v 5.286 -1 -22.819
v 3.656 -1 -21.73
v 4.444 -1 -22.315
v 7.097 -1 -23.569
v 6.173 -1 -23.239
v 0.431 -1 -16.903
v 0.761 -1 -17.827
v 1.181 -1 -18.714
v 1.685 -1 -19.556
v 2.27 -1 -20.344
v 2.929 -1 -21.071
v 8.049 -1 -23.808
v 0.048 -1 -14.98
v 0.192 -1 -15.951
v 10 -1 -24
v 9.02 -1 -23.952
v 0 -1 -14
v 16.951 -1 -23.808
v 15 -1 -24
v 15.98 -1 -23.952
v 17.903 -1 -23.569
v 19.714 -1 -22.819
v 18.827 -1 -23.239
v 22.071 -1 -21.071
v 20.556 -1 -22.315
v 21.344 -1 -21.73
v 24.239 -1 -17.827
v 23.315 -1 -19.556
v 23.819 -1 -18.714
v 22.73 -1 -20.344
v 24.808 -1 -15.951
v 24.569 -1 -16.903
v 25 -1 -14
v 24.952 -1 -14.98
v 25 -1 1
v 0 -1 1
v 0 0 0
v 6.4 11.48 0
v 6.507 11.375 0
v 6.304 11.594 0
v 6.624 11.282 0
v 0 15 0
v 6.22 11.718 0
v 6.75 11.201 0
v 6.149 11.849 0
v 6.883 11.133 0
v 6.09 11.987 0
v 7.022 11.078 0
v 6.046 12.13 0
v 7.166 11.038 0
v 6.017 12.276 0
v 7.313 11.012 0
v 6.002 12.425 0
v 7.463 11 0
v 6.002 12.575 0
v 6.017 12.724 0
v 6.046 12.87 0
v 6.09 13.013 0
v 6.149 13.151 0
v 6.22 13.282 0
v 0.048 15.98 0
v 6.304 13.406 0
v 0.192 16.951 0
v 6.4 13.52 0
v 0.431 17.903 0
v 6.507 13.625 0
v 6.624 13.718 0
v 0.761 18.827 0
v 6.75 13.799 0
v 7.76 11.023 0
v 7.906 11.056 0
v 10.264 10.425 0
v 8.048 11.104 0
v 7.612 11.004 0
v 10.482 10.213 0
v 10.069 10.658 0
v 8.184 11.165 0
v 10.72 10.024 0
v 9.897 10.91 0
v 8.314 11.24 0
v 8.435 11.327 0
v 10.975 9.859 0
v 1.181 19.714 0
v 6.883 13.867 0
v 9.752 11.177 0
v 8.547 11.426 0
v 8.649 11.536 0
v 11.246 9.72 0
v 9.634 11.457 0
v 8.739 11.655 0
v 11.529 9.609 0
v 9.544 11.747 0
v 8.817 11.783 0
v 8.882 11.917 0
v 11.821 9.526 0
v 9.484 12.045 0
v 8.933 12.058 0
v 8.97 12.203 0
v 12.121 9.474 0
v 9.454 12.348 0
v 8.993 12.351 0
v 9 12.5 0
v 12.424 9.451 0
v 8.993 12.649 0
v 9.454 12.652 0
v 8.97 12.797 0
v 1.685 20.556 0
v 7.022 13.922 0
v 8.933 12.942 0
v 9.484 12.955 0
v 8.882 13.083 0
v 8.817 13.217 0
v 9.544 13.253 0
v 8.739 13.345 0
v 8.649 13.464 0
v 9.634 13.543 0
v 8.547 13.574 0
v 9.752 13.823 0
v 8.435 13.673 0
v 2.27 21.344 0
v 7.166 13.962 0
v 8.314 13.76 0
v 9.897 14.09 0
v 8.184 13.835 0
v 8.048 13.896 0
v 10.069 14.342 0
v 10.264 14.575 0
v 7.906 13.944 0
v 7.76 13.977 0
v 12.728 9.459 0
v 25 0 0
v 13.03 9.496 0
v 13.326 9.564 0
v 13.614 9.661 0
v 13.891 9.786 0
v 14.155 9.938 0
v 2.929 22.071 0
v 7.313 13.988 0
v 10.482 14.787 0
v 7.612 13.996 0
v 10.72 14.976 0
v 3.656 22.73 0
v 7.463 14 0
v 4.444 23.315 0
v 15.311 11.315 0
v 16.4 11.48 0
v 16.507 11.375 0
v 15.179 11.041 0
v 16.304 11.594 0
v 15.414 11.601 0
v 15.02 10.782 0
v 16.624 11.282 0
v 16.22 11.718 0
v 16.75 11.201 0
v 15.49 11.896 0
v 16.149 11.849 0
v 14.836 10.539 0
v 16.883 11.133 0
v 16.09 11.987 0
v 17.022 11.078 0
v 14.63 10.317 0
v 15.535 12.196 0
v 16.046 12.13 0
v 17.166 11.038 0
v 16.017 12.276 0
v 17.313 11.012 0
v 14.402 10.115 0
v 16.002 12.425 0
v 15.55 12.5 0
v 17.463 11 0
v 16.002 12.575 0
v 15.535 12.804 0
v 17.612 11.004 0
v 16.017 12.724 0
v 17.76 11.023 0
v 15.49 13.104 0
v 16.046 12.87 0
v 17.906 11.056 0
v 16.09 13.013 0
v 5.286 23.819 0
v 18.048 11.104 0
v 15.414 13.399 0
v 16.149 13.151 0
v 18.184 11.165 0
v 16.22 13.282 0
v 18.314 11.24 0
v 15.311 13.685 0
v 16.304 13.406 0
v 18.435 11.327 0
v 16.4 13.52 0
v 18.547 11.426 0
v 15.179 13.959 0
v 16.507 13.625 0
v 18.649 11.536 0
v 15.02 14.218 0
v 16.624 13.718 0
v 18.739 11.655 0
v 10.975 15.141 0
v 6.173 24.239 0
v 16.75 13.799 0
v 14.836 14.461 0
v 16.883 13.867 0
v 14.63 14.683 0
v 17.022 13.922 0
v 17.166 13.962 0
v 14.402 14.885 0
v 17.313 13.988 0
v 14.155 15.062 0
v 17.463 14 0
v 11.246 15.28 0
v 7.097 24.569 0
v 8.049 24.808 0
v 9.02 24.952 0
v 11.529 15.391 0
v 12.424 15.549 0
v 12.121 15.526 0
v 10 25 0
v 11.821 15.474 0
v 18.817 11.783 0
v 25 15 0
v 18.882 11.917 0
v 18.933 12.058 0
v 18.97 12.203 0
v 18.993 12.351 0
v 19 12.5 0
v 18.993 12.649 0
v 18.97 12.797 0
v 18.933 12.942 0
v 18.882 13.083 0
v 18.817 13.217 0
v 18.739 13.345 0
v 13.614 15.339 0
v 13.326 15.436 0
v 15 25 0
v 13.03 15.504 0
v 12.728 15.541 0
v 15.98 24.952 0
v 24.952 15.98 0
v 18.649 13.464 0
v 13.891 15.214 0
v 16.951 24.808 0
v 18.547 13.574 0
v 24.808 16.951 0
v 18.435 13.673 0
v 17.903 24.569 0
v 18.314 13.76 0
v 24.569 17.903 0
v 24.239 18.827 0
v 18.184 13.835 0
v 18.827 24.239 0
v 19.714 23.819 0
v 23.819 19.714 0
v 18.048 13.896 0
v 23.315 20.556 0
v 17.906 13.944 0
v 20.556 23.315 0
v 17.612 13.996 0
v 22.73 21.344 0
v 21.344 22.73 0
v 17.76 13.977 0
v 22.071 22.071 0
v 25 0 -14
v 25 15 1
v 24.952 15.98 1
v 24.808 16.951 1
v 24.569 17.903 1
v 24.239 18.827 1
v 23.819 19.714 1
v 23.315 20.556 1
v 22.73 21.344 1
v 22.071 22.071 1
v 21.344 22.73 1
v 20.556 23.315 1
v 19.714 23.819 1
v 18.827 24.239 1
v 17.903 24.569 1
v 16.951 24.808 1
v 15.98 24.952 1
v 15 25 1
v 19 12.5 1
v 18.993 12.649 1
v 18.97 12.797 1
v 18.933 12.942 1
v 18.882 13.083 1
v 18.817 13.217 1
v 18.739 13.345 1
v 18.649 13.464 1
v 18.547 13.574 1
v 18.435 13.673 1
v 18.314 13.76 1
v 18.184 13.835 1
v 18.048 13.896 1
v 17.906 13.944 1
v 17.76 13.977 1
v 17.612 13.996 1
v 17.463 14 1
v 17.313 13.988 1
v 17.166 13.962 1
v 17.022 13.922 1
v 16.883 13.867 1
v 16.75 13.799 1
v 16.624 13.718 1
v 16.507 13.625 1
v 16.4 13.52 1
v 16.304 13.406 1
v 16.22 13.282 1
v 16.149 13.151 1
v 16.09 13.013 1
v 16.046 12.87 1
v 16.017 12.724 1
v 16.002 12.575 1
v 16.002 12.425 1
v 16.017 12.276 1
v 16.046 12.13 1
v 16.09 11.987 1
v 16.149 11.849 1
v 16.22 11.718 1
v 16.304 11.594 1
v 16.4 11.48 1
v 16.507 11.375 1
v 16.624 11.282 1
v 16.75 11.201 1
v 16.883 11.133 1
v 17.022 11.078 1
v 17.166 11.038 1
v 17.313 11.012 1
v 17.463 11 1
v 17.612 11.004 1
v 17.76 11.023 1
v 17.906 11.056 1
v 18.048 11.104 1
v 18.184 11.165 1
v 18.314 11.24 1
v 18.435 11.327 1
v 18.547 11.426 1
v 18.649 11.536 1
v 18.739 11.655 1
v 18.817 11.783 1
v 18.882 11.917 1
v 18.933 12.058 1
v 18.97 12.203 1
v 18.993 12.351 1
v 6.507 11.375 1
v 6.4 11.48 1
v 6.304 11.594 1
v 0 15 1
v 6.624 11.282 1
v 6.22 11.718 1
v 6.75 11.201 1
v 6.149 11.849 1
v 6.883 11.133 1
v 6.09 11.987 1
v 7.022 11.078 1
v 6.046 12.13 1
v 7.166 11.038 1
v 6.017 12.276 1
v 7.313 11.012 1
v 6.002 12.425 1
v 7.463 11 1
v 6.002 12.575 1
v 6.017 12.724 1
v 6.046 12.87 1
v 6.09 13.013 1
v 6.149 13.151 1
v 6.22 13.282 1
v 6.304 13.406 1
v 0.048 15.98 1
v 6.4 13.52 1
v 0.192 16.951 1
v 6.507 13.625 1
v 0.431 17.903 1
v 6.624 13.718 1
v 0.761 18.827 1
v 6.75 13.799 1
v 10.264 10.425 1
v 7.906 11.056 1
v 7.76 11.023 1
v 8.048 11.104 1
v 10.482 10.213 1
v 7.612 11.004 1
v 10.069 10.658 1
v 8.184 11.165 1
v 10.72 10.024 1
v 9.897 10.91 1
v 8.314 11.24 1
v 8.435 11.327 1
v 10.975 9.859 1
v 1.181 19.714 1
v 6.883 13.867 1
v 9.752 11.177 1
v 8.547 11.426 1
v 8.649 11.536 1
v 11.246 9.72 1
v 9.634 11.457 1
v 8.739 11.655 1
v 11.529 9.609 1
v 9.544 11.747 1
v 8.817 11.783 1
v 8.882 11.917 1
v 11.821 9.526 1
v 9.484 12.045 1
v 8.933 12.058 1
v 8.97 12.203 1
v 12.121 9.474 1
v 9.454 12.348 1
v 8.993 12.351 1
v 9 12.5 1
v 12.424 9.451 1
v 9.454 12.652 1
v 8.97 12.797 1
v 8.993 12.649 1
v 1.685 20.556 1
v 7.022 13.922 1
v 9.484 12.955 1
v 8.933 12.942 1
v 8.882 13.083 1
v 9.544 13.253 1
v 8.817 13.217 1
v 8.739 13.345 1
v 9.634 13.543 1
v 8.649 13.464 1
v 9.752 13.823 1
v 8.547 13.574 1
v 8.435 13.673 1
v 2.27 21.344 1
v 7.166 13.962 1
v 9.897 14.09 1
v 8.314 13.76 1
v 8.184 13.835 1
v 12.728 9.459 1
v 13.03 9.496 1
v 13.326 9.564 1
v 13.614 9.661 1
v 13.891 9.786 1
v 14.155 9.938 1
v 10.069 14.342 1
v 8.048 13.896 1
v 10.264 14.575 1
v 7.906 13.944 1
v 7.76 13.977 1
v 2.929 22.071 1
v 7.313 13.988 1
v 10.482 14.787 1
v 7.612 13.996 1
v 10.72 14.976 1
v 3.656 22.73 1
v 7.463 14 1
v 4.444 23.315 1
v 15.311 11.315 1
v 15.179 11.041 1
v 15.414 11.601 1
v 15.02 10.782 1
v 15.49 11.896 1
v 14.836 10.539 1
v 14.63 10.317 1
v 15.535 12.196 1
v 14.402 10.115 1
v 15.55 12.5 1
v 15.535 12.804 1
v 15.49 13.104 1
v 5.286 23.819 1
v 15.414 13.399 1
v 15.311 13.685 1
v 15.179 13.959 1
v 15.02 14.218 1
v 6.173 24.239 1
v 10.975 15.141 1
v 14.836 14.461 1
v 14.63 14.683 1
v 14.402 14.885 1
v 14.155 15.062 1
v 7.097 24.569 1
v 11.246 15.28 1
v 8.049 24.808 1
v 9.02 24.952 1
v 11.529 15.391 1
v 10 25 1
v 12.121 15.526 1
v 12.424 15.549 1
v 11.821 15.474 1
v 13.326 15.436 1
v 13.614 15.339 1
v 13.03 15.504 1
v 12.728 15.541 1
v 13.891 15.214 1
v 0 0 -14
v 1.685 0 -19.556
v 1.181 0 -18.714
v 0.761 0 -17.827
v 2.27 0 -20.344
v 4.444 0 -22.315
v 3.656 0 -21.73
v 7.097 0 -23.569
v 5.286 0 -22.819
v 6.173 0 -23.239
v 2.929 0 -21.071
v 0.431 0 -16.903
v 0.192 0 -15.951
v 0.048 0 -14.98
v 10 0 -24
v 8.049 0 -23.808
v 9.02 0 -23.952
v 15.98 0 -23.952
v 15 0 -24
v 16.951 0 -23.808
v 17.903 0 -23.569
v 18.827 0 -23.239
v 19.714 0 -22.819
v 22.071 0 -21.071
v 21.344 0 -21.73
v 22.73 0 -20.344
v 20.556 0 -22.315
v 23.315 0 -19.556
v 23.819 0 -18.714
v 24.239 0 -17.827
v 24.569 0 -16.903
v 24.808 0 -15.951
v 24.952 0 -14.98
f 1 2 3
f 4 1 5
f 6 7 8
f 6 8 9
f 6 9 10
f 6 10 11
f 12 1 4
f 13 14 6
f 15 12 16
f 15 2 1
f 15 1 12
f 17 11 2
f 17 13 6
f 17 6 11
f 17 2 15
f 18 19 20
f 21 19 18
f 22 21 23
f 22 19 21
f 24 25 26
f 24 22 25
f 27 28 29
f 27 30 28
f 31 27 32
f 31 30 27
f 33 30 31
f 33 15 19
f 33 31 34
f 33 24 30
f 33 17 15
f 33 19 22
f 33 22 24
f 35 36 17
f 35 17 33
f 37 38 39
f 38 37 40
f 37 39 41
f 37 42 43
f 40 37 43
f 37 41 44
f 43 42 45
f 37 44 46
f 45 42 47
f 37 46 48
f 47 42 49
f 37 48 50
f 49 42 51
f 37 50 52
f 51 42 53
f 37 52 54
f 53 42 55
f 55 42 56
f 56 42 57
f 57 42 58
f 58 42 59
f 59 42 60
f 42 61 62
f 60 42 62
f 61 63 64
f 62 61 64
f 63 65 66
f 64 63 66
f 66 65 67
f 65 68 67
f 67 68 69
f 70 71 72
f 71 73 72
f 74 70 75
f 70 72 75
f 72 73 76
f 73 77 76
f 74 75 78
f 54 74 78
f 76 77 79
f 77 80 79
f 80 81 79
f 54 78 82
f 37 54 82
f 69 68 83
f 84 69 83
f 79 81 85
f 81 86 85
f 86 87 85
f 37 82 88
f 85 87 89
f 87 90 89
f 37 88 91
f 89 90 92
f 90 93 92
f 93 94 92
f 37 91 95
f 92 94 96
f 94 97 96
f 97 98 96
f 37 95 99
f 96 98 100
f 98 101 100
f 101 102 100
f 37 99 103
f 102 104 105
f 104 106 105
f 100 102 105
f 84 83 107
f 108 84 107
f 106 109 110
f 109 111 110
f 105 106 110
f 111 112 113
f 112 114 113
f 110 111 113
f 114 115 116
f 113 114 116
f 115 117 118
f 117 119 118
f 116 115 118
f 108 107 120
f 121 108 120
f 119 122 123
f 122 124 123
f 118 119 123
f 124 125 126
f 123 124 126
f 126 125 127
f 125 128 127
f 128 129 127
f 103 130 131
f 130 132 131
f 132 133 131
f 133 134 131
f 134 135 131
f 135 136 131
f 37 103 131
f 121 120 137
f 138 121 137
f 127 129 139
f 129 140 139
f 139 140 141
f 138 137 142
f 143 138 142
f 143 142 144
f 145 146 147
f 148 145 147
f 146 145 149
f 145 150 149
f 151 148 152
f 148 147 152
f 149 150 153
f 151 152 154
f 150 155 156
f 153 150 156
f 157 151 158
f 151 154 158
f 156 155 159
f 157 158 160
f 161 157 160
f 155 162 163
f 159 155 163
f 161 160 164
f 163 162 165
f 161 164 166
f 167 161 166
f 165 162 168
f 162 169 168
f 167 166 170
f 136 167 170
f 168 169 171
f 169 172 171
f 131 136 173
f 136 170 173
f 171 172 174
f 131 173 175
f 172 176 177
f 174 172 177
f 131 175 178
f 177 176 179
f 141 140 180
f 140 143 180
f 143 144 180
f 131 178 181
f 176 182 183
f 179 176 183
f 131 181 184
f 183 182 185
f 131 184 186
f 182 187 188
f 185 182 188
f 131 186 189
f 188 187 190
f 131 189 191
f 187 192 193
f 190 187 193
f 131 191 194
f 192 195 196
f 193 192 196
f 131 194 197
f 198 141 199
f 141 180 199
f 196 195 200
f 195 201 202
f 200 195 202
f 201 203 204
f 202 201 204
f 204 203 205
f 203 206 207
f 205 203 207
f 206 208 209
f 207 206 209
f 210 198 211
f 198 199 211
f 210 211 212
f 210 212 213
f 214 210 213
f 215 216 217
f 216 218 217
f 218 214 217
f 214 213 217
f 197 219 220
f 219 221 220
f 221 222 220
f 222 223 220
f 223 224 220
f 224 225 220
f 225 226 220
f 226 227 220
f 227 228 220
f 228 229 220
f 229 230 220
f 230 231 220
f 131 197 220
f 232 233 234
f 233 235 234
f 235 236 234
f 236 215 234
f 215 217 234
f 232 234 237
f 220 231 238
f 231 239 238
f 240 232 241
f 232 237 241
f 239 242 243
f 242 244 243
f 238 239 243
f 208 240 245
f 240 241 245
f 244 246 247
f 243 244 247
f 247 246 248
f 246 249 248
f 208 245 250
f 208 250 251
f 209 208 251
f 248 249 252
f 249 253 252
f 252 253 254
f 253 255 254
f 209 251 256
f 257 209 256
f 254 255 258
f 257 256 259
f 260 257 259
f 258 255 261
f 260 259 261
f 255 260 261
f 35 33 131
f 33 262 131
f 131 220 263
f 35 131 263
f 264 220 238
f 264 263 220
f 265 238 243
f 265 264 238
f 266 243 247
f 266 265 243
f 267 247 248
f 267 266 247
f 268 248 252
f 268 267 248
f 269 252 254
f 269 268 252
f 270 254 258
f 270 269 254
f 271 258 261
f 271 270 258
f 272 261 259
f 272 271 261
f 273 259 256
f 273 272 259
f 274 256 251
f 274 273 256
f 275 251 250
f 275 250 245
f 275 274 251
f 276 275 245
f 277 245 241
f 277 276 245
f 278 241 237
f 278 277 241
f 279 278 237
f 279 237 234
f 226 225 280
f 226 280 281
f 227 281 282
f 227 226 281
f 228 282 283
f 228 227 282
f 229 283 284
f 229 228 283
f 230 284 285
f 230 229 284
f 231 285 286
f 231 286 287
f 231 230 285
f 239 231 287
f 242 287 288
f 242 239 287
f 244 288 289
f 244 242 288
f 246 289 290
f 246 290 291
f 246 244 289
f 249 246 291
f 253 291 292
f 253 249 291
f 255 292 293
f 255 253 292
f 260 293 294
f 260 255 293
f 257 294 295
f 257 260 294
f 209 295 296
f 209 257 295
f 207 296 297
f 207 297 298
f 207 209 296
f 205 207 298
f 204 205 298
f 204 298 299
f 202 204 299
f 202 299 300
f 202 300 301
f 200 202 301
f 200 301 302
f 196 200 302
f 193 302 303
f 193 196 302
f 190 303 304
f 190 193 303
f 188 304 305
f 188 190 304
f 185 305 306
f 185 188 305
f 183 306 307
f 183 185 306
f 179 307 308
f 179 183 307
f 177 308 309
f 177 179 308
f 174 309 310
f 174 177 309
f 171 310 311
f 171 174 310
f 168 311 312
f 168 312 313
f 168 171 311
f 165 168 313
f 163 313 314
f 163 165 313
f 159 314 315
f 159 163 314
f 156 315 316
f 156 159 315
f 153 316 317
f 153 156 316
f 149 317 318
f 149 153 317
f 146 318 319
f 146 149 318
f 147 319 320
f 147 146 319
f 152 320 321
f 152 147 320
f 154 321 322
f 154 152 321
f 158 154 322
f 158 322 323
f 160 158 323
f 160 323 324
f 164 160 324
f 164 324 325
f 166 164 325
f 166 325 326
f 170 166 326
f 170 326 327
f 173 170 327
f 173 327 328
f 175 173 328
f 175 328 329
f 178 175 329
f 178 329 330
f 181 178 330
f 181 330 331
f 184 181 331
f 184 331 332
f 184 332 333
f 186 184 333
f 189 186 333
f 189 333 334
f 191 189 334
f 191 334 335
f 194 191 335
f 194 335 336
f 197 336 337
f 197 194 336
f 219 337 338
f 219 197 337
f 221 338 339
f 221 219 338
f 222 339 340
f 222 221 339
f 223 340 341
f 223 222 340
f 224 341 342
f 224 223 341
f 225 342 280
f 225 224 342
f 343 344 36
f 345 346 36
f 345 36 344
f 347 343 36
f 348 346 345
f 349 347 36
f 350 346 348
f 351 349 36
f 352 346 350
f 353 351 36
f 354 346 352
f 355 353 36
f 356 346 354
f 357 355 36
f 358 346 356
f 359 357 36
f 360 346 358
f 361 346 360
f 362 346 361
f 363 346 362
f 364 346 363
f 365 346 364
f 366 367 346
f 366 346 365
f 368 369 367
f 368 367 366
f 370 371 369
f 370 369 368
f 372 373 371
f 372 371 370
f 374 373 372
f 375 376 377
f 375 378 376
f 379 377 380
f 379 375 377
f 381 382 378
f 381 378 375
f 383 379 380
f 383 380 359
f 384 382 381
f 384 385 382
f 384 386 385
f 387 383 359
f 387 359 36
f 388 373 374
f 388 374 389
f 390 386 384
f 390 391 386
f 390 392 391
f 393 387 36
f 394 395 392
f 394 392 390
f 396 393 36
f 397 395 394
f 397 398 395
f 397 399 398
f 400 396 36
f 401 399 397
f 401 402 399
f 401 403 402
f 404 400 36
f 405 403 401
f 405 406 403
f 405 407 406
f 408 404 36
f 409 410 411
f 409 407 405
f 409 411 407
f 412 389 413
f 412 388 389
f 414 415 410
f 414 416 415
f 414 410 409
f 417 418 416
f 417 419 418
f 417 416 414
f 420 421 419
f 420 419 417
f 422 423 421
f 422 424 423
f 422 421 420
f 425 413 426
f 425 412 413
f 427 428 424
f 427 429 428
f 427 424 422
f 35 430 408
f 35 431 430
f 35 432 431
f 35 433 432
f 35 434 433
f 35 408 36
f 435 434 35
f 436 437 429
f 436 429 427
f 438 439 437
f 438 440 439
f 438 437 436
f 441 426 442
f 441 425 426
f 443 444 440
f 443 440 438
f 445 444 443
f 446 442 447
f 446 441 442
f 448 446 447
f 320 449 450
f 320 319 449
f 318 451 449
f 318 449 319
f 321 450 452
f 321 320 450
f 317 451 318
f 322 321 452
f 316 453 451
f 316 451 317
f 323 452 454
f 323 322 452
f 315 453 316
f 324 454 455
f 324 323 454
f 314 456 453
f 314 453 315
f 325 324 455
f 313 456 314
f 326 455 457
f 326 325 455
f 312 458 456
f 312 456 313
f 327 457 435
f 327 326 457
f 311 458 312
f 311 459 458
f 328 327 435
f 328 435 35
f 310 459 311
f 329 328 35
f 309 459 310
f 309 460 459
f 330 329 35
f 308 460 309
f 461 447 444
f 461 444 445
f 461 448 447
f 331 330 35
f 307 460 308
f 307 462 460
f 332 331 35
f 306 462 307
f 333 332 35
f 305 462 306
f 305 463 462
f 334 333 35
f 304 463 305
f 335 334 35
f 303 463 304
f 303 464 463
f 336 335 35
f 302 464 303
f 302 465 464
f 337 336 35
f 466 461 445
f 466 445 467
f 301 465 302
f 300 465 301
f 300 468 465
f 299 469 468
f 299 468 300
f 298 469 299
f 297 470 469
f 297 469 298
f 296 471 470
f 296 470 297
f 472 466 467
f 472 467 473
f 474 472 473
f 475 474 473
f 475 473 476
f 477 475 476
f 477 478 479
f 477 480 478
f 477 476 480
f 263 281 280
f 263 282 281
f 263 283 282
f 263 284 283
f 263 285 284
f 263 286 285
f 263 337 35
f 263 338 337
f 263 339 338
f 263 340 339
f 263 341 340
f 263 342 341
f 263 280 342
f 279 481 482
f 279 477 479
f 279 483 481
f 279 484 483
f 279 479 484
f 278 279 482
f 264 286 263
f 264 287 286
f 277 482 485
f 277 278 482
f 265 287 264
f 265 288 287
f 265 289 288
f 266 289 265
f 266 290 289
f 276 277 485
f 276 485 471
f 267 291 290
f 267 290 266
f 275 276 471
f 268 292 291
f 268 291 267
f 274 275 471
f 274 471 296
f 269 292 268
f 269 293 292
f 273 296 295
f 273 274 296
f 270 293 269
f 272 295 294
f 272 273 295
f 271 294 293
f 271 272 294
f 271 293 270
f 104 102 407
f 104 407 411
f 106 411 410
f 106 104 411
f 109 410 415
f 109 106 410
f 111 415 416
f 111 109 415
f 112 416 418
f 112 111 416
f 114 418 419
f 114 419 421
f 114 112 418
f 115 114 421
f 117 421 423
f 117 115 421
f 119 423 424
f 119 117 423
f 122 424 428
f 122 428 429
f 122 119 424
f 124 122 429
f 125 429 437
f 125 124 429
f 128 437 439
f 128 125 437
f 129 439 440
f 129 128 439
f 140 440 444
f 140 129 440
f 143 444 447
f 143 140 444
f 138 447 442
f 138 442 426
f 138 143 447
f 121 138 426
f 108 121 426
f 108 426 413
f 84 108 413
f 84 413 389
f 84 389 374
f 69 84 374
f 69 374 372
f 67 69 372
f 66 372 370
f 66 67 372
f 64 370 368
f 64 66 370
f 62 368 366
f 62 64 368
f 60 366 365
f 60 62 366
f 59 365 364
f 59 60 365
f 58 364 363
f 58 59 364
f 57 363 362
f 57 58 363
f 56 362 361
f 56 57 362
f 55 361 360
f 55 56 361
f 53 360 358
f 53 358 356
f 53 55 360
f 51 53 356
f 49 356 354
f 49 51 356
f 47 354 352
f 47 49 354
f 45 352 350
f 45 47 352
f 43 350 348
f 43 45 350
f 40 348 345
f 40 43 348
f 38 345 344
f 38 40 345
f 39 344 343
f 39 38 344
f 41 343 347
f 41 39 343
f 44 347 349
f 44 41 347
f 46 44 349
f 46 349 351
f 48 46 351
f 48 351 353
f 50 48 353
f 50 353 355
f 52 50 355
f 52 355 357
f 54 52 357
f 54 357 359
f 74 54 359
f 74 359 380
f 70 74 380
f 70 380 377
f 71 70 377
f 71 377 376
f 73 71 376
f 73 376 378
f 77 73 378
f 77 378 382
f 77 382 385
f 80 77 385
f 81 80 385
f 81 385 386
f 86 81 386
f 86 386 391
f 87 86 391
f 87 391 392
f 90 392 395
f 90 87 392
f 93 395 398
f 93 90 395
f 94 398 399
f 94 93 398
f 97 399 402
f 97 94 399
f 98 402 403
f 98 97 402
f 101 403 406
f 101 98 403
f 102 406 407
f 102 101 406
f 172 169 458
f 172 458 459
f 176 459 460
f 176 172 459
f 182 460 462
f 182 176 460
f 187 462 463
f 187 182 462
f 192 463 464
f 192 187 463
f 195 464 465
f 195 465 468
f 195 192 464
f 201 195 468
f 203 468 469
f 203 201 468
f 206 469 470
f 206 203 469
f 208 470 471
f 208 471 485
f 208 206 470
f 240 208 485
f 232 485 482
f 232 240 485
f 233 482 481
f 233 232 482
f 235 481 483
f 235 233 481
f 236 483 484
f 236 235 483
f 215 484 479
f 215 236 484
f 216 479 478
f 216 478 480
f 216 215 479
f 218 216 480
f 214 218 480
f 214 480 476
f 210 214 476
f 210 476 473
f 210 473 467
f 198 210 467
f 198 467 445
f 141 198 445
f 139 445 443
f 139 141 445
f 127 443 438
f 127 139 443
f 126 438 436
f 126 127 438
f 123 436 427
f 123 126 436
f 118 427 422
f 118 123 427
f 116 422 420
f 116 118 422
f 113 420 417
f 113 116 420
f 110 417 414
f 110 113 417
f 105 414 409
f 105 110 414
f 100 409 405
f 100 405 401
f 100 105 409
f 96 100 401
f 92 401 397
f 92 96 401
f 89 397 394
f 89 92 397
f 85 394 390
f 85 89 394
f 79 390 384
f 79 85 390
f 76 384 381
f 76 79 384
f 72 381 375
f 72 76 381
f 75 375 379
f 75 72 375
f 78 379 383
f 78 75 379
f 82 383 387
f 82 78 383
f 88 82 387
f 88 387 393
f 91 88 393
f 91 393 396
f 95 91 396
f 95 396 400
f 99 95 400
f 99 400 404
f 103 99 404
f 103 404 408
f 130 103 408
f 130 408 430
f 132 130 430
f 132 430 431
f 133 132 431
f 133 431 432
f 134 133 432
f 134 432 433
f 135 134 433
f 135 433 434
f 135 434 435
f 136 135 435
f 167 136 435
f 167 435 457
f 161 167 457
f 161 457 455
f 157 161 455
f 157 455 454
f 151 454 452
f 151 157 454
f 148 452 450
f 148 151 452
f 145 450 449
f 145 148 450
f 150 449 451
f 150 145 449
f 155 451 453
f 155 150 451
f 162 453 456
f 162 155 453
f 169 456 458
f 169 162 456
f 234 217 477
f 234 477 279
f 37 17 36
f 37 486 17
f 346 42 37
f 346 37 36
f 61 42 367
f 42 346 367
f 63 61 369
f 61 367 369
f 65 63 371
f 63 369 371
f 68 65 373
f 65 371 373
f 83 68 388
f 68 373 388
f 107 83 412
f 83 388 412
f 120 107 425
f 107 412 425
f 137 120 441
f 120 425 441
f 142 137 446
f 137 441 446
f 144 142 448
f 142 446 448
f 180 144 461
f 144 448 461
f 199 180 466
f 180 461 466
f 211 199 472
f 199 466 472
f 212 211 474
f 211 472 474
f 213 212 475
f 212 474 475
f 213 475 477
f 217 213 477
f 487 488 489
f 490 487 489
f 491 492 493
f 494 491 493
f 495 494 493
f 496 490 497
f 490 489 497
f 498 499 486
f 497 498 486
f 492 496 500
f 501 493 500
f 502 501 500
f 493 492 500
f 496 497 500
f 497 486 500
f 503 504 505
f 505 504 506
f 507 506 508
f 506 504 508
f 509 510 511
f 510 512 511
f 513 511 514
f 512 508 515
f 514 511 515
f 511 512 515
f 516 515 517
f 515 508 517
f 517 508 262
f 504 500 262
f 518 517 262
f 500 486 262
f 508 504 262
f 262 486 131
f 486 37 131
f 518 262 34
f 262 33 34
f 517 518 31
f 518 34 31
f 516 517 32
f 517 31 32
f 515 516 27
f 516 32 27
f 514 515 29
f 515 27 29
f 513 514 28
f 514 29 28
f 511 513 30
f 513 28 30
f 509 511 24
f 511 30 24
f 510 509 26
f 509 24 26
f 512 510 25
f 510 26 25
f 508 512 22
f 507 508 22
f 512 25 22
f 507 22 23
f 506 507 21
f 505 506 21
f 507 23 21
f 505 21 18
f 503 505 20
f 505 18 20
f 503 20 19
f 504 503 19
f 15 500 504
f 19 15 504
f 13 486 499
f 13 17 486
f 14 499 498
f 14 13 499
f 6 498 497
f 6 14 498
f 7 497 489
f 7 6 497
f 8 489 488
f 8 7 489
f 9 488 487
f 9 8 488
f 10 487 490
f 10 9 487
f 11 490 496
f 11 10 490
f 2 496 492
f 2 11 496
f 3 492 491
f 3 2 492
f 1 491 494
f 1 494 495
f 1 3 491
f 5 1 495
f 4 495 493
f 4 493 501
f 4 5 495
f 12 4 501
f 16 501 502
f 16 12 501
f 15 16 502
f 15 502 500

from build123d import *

# Parameters (mm, degrees)
SKETCH1_W      = 25
SKETCH1_H      = 25
SKETCH1_R      = 3.05
SKETCH1_R_2    = 1.5
EXTRUDE1_DEPTH = 1
SKETCH2_W      = 25
SKETCH2_H      = 25
EXTRUDE2_DEPTH = 1
FILLET1_R      = 10


with BuildPart() as part:
    # Sketch1 → Extrude1 (new body)
    with BuildSketch(Plane.XY):
        with Locations((12.5, 12.5)):
            Rectangle(SKETCH1_W, SKETCH1_H)
        with Locations((12.5, 12.5)):
            Circle(SKETCH1_R, mode=Mode.SUBTRACT)
        with Locations((17.5, 12.5)):
            Circle(SKETCH1_R_2, mode=Mode.SUBTRACT)
        with Locations((7.5, 12.5)):
            Circle(SKETCH1_R_2, mode=Mode.SUBTRACT)
    extrude(amount=EXTRUDE1_DEPTH)

    # Sketch2 → Extrude2 (add)
    with BuildSketch(Plane.XZ):
        with Locations((12.5, -11.5)):
            Rectangle(SKETCH2_W, SKETCH2_H)
    extrude(amount=EXTRUDE2_DEPTH)

    # Fillet1
    fillet1_edges = [part.edges().sort_by_distance(p)[0] for p in [
        (0, -0.5, -24),
        (25, -0.5, -24),
        (0, 25, 0.5),
        (25, 25, 0.5),
    ]]
    fillet(fillet1_edges, radius=FILLET1_R)


solid = part.part
